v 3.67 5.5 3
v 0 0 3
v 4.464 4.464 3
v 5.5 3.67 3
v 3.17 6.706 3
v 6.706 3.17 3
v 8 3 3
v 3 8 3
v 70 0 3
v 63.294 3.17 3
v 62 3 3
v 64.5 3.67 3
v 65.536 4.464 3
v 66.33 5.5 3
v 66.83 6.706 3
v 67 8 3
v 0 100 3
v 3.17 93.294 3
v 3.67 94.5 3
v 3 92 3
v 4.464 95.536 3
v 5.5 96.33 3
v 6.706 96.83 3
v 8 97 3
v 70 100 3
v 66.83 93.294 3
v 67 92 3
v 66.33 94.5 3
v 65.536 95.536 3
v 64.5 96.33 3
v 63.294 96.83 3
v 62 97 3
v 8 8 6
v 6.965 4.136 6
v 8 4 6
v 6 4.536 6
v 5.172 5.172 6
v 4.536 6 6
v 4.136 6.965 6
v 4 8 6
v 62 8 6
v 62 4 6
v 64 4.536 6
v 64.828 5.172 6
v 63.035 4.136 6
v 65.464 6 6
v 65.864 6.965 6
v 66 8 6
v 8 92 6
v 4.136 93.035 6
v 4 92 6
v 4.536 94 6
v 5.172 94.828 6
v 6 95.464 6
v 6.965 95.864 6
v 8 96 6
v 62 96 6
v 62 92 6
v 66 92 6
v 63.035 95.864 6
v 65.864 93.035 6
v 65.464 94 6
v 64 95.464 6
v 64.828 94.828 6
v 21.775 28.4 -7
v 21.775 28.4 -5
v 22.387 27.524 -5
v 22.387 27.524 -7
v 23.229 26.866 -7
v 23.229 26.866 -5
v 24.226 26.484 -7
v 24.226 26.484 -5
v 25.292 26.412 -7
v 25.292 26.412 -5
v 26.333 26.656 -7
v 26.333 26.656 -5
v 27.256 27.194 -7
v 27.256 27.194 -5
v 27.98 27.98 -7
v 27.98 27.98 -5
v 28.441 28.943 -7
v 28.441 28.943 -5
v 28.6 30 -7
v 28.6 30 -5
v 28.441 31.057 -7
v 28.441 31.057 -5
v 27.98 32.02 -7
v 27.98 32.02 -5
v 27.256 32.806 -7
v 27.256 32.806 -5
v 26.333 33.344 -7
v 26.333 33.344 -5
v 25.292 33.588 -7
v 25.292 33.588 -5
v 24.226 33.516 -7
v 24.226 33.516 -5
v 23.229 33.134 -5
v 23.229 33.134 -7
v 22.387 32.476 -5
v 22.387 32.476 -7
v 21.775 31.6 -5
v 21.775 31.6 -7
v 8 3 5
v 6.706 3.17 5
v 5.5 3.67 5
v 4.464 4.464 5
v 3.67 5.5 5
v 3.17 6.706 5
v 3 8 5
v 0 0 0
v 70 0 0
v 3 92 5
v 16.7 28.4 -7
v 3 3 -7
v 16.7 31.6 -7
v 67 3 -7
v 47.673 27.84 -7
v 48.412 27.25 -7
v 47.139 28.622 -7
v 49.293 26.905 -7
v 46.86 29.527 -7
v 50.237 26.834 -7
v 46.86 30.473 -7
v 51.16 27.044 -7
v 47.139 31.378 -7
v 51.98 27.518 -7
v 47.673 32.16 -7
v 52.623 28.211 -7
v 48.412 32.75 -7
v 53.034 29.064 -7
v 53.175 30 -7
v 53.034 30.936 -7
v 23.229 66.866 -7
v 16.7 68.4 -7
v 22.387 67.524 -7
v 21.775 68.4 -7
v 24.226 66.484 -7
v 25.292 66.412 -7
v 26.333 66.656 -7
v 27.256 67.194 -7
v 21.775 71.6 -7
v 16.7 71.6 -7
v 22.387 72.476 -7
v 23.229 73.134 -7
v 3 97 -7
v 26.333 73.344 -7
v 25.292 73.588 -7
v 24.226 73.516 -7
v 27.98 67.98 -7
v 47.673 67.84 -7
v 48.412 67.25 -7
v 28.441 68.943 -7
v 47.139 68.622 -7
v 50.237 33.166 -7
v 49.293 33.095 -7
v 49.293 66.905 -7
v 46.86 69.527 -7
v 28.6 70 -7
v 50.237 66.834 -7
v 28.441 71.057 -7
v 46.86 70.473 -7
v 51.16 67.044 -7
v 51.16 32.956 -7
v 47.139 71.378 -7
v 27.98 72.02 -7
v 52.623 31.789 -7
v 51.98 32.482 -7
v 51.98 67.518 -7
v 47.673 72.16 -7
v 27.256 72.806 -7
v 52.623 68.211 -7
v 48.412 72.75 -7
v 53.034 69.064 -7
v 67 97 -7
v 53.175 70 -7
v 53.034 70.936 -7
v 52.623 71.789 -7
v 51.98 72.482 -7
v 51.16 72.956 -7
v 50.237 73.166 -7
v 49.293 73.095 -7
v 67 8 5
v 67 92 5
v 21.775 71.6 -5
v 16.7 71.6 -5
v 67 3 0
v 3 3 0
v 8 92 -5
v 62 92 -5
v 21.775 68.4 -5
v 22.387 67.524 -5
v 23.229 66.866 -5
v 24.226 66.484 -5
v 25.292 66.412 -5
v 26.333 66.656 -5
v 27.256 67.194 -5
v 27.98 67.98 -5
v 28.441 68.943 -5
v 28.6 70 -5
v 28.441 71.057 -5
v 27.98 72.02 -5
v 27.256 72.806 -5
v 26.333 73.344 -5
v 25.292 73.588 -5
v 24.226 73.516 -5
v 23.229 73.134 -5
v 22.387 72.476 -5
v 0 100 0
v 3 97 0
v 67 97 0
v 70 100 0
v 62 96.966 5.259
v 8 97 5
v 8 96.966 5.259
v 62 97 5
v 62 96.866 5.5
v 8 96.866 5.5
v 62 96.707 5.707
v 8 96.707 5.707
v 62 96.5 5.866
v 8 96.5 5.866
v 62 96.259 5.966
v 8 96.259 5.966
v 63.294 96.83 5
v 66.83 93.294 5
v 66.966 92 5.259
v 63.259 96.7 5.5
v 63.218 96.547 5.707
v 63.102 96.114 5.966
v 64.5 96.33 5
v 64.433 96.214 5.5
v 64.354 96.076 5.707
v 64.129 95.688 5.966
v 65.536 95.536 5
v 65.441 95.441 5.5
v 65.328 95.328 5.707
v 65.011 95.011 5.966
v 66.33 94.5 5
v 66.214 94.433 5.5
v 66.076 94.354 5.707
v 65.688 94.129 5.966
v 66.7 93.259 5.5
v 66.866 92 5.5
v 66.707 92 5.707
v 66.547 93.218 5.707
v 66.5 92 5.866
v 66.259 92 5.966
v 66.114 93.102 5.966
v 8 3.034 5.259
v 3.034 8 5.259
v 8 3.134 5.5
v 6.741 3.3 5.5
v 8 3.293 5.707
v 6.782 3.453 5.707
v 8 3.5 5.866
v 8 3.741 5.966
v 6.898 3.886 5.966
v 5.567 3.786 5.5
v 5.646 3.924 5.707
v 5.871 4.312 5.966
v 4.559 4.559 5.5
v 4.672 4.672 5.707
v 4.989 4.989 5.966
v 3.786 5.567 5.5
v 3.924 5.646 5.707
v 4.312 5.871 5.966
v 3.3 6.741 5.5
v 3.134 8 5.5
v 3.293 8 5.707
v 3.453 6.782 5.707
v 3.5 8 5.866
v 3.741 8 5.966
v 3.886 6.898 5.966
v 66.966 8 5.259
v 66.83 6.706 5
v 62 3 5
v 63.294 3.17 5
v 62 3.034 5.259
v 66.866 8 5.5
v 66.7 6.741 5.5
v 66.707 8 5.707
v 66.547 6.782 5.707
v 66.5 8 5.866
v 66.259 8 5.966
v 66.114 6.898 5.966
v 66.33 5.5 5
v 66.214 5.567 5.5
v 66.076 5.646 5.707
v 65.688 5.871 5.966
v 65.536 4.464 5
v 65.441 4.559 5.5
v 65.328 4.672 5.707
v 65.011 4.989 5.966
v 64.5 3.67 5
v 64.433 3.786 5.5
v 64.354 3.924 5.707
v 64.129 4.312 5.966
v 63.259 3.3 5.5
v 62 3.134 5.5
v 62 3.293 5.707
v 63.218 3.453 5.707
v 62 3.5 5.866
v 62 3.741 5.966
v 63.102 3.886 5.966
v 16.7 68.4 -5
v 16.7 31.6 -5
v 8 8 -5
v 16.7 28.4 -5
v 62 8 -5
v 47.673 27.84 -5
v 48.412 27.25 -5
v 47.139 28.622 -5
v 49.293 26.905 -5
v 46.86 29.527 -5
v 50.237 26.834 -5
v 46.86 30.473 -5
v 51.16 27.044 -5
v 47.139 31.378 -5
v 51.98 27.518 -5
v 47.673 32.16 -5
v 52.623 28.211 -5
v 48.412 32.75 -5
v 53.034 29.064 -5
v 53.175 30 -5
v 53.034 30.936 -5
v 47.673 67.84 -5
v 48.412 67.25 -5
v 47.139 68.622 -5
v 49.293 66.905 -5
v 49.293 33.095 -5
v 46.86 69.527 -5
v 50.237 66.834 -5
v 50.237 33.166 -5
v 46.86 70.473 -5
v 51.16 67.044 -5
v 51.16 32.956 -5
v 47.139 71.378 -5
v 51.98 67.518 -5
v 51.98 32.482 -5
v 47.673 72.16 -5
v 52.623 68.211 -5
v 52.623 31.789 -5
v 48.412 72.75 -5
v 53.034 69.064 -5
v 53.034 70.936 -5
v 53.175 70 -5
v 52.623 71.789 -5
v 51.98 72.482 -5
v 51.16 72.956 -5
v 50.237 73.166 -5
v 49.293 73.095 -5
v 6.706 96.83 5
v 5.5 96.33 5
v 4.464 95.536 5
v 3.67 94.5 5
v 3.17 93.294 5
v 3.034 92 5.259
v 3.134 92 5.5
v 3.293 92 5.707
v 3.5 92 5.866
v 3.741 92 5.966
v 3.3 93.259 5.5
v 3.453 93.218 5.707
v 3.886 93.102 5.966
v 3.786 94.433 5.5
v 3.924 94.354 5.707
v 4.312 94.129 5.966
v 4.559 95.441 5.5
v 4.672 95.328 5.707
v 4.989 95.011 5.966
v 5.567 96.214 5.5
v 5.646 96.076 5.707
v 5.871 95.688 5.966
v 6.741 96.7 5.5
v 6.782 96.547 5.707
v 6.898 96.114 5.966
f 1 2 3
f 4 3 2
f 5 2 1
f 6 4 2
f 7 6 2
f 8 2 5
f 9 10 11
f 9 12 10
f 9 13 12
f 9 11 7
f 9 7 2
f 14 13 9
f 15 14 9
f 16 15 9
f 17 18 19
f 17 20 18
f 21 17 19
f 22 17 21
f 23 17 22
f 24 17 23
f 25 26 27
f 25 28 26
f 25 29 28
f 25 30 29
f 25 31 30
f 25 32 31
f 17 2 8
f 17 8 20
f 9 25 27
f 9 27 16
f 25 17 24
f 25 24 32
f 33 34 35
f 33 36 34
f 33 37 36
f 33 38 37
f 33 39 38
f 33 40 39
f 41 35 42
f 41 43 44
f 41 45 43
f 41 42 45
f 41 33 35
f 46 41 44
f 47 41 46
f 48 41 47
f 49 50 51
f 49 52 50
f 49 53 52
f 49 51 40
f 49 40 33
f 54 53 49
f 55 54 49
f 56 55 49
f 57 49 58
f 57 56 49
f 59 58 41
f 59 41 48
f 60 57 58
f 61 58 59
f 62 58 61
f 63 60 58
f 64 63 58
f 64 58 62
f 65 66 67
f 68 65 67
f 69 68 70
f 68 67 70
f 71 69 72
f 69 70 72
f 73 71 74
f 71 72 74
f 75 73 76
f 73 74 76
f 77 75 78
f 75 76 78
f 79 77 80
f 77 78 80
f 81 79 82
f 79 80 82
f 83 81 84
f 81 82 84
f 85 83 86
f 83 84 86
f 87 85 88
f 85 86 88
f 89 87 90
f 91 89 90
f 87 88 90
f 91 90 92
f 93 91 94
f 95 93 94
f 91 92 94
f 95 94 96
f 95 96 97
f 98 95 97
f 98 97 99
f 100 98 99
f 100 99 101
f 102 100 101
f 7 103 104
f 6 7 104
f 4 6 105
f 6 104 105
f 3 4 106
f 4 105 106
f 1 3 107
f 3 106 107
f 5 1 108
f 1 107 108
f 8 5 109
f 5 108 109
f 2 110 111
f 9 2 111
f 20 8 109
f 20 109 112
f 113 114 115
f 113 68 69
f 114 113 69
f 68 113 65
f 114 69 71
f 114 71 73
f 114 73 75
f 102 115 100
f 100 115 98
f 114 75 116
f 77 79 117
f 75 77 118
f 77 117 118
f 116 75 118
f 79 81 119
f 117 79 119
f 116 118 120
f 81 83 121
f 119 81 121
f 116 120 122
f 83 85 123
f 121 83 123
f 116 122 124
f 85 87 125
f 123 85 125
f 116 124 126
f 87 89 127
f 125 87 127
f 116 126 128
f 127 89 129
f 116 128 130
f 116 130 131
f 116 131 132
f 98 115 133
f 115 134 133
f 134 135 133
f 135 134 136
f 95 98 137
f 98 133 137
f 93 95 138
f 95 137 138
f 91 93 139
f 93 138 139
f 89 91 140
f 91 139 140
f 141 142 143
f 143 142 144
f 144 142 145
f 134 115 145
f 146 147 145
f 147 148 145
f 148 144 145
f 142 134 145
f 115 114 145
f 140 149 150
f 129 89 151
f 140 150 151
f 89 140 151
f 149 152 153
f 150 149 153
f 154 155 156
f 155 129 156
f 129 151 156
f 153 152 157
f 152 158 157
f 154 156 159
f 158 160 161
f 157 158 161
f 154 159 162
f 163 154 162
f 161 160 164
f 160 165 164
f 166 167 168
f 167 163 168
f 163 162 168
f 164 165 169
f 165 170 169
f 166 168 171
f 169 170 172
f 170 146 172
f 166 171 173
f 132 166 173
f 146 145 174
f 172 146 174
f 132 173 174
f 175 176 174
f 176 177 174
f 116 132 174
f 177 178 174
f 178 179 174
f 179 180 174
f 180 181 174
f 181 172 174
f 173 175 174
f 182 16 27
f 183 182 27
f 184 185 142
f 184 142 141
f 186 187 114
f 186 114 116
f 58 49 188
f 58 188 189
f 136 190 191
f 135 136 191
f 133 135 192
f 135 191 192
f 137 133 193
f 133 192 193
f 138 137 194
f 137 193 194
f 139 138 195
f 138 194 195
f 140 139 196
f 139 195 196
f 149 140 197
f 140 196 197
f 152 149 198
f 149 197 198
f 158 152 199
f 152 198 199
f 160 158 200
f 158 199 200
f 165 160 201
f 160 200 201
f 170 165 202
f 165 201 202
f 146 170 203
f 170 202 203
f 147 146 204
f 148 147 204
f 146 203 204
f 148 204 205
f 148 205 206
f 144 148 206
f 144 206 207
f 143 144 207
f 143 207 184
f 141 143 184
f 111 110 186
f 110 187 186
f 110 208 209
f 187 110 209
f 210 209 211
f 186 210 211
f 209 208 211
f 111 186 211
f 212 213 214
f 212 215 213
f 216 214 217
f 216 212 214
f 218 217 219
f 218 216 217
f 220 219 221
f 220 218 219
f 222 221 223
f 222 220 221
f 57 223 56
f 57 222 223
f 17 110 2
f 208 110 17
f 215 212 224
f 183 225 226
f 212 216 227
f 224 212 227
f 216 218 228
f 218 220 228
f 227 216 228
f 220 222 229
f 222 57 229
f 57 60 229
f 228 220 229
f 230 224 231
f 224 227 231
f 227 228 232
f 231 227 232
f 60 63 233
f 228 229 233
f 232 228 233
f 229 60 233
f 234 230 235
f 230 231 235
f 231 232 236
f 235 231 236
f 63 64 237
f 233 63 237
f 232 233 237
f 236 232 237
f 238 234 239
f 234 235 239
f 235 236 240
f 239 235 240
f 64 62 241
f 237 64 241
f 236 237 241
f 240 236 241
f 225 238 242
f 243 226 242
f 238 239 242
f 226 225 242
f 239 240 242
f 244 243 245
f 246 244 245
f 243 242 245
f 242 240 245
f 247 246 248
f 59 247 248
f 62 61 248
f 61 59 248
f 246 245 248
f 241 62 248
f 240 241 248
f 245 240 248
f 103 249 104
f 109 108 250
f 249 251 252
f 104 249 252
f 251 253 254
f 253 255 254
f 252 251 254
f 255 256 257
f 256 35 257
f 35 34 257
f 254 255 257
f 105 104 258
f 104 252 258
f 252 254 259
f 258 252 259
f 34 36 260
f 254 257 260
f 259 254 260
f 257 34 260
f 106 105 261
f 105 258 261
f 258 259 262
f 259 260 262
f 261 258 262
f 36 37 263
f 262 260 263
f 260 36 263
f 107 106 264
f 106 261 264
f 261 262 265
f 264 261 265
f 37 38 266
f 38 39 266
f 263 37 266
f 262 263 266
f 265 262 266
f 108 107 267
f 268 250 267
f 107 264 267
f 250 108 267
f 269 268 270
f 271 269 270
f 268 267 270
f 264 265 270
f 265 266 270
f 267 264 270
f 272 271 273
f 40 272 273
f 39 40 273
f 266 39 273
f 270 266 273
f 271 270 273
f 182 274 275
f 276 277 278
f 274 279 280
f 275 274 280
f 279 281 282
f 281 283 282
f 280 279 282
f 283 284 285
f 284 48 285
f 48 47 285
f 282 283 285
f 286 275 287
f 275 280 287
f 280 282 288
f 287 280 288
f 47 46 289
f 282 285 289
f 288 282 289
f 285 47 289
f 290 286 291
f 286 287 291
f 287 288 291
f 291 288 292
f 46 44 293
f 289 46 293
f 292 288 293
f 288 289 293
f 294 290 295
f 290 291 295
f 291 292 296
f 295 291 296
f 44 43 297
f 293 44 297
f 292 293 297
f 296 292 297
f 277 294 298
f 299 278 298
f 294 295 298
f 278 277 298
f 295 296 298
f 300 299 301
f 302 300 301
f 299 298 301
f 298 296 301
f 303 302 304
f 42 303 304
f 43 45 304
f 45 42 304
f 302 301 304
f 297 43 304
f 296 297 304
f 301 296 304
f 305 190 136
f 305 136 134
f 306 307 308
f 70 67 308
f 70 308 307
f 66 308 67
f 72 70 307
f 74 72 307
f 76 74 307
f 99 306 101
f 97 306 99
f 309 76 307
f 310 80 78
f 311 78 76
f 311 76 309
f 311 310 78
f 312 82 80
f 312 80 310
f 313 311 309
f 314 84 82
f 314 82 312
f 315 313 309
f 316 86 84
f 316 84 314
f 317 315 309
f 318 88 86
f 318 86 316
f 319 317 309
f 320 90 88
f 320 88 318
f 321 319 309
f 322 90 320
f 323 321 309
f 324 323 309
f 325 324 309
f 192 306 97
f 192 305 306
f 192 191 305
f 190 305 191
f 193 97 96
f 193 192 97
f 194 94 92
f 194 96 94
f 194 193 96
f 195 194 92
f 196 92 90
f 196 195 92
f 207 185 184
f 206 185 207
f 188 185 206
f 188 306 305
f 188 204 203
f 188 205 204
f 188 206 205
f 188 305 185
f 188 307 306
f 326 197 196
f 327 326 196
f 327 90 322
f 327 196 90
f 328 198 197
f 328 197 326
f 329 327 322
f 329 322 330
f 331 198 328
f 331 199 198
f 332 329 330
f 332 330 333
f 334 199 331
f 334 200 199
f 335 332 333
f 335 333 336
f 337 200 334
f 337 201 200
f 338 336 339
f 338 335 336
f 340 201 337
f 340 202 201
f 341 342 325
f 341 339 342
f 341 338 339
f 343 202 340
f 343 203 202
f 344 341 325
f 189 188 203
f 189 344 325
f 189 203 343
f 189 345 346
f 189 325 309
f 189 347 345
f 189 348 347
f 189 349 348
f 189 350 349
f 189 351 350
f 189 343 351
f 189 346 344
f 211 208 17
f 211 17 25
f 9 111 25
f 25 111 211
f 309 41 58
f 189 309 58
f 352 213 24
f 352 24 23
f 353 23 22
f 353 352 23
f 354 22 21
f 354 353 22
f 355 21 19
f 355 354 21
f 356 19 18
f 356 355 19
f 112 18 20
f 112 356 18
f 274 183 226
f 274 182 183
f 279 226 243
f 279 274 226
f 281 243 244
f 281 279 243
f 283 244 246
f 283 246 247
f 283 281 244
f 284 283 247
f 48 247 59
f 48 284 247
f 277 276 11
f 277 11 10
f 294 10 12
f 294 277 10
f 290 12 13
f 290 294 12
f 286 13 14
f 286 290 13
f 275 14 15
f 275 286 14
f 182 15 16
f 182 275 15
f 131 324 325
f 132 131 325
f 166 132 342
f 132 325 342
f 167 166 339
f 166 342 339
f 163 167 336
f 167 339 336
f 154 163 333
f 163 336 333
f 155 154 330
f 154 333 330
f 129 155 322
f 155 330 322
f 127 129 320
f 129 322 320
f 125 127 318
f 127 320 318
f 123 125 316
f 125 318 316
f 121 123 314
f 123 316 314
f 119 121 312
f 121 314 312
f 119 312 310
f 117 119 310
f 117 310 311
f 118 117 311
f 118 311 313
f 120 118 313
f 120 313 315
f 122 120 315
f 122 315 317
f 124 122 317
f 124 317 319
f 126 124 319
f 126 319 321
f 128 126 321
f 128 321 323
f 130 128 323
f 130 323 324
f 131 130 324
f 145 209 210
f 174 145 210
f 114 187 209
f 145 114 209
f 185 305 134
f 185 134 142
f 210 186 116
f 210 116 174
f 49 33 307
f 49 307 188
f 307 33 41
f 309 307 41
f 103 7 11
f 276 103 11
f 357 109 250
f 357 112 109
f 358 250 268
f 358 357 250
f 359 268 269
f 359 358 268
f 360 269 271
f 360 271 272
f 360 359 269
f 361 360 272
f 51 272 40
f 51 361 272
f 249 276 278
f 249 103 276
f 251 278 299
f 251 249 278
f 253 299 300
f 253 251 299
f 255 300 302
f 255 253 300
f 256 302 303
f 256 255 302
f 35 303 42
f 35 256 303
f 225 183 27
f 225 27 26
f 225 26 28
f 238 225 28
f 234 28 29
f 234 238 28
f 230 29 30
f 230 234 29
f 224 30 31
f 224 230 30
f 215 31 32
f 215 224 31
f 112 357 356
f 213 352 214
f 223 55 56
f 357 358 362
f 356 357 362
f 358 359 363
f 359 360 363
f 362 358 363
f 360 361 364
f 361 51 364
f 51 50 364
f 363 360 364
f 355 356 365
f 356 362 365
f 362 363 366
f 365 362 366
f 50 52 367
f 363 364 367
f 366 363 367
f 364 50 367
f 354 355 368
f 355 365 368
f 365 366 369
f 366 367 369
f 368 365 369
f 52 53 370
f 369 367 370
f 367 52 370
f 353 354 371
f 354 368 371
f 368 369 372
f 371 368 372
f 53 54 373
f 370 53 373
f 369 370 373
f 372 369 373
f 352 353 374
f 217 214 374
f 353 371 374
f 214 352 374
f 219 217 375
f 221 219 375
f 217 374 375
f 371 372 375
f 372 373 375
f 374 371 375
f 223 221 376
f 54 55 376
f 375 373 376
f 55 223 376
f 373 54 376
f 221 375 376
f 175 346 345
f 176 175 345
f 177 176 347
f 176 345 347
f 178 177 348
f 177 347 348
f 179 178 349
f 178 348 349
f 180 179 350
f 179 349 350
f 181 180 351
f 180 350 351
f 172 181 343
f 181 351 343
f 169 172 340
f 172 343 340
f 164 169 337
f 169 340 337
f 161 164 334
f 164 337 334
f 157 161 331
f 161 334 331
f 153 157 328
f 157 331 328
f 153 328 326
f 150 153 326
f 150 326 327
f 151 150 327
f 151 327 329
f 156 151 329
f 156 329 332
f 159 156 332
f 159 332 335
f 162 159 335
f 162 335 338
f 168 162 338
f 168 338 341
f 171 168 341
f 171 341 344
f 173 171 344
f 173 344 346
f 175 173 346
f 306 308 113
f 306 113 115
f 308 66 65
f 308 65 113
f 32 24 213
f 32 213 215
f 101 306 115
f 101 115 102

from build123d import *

# Parameters (mm, degrees)
SKETCH_W          = 70
SKETCH_H          = 100
PAD_DEPTH         = 3
SKETCH001_W       = 64
SKETCH001_H       = 94
PAD001_DEPTH      = 3
PAD001_DEPTH_BACK = 10
SKETCH002_W       = 54
SKETCH002_H       = 84
POCKET_DEPTH      = 11
SKETCH003_R       = 3.175
POCKET001_DEPTH   = 2.001
FILLET_R          = 5
FILLET001_R       = 5
FILLET002_R       = 5
FILLET003_R       = 5
FILLET004_R       = 1


with BuildPart() as part:
    # Sketch → Pad (new body)
    with BuildSketch(Plane.XY):
        with Locations((35, 50)):
            Rectangle(SKETCH_W, SKETCH_H)
    extrude(amount=PAD_DEPTH)

    # Sketch001 (on Face6 of Pad) → Pad001 (join, two sides)
    with BuildSketch(Plane.XY.offset(3)) as pad001_sk:
        with Locations((35, 50)):
            Rectangle(SKETCH001_W, SKETCH001_H)
    extrude(amount=PAD001_DEPTH)
    extrude(pad001_sk.sketch, amount=-PAD001_DEPTH_BACK)

    # Sketch002 (on Face16 of Pad001) → Pocket (cut)
    with BuildSketch(Plane.XY.offset(6)):
        with Locations((35, 50)):
            Rectangle(SKETCH002_W, SKETCH002_H)
    extrude(amount=-POCKET_DEPTH, mode=Mode.SUBTRACT)

    # Sketch003 (on Face21 of Pocket) → Pocket001 (cut, through all)
    with BuildSketch(Plane.XY.offset(-5)):
        with Locations((50, 30)):
            Circle(SKETCH003_R)
        with Locations((50, 70)):
            Circle(SKETCH003_R)
        with BuildLine():
            ThreePointArc((21.775097, 28.4), (28.6, 30), (21.775097, 31.6))
            Line((16.7, 31.6), (21.775097, 31.6))
            Line((16.7, 28.4), (16.7, 31.6))
            Line((21.775097, 28.4), (16.7, 28.4))
        make_face()
        with BuildLine():
            ThreePointArc((21.775097, 68.4), (28.6, 70), (21.775097, 71.6))
            Line((16.7, 71.6), (21.775097, 71.6))
            Line((16.7, 68.4), (16.7, 71.6))
            Line((21.775097, 68.4), (16.7, 68.4))
        make_face()
    extrude(amount=-POCKET001_DEPTH, mode=Mode.SUBTRACT)

    # Fillet
    fillet_edges = [part.edges().sort_by_distance(p)[0] for p in [
        (3, 3, 4.5),
    ]]
    fillet(fillet_edges, radius=FILLET_R)

    # Fillet001
    fillet001_edges = [part.edges().sort_by_distance(p)[0] for p in [
        (67, 3, 4.5),
    ]]
    fillet(fillet001_edges, radius=FILLET001_R)

    # Fillet002
    fillet002_edges = [part.edges().sort_by_distance(p)[0] for p in [
        (67, 97, 4.5),
    ]]
    fillet(fillet002_edges, radius=FILLET002_R)

    # Fillet003
    fillet003_edges = [part.edges().sort_by_distance(p)[0] for p in [
        (3, 97, 4.5),
    ]]
    fillet(fillet003_edges, radius=FILLET003_R)

    # Fillet004
    fillet004_edges = [part.edges().sort_by_distance(p)[0] for p in [
        (35, 97, 6),
    ]]
    fillet(fillet004_edges, radius=FILLET004_R)


solid = part.part
